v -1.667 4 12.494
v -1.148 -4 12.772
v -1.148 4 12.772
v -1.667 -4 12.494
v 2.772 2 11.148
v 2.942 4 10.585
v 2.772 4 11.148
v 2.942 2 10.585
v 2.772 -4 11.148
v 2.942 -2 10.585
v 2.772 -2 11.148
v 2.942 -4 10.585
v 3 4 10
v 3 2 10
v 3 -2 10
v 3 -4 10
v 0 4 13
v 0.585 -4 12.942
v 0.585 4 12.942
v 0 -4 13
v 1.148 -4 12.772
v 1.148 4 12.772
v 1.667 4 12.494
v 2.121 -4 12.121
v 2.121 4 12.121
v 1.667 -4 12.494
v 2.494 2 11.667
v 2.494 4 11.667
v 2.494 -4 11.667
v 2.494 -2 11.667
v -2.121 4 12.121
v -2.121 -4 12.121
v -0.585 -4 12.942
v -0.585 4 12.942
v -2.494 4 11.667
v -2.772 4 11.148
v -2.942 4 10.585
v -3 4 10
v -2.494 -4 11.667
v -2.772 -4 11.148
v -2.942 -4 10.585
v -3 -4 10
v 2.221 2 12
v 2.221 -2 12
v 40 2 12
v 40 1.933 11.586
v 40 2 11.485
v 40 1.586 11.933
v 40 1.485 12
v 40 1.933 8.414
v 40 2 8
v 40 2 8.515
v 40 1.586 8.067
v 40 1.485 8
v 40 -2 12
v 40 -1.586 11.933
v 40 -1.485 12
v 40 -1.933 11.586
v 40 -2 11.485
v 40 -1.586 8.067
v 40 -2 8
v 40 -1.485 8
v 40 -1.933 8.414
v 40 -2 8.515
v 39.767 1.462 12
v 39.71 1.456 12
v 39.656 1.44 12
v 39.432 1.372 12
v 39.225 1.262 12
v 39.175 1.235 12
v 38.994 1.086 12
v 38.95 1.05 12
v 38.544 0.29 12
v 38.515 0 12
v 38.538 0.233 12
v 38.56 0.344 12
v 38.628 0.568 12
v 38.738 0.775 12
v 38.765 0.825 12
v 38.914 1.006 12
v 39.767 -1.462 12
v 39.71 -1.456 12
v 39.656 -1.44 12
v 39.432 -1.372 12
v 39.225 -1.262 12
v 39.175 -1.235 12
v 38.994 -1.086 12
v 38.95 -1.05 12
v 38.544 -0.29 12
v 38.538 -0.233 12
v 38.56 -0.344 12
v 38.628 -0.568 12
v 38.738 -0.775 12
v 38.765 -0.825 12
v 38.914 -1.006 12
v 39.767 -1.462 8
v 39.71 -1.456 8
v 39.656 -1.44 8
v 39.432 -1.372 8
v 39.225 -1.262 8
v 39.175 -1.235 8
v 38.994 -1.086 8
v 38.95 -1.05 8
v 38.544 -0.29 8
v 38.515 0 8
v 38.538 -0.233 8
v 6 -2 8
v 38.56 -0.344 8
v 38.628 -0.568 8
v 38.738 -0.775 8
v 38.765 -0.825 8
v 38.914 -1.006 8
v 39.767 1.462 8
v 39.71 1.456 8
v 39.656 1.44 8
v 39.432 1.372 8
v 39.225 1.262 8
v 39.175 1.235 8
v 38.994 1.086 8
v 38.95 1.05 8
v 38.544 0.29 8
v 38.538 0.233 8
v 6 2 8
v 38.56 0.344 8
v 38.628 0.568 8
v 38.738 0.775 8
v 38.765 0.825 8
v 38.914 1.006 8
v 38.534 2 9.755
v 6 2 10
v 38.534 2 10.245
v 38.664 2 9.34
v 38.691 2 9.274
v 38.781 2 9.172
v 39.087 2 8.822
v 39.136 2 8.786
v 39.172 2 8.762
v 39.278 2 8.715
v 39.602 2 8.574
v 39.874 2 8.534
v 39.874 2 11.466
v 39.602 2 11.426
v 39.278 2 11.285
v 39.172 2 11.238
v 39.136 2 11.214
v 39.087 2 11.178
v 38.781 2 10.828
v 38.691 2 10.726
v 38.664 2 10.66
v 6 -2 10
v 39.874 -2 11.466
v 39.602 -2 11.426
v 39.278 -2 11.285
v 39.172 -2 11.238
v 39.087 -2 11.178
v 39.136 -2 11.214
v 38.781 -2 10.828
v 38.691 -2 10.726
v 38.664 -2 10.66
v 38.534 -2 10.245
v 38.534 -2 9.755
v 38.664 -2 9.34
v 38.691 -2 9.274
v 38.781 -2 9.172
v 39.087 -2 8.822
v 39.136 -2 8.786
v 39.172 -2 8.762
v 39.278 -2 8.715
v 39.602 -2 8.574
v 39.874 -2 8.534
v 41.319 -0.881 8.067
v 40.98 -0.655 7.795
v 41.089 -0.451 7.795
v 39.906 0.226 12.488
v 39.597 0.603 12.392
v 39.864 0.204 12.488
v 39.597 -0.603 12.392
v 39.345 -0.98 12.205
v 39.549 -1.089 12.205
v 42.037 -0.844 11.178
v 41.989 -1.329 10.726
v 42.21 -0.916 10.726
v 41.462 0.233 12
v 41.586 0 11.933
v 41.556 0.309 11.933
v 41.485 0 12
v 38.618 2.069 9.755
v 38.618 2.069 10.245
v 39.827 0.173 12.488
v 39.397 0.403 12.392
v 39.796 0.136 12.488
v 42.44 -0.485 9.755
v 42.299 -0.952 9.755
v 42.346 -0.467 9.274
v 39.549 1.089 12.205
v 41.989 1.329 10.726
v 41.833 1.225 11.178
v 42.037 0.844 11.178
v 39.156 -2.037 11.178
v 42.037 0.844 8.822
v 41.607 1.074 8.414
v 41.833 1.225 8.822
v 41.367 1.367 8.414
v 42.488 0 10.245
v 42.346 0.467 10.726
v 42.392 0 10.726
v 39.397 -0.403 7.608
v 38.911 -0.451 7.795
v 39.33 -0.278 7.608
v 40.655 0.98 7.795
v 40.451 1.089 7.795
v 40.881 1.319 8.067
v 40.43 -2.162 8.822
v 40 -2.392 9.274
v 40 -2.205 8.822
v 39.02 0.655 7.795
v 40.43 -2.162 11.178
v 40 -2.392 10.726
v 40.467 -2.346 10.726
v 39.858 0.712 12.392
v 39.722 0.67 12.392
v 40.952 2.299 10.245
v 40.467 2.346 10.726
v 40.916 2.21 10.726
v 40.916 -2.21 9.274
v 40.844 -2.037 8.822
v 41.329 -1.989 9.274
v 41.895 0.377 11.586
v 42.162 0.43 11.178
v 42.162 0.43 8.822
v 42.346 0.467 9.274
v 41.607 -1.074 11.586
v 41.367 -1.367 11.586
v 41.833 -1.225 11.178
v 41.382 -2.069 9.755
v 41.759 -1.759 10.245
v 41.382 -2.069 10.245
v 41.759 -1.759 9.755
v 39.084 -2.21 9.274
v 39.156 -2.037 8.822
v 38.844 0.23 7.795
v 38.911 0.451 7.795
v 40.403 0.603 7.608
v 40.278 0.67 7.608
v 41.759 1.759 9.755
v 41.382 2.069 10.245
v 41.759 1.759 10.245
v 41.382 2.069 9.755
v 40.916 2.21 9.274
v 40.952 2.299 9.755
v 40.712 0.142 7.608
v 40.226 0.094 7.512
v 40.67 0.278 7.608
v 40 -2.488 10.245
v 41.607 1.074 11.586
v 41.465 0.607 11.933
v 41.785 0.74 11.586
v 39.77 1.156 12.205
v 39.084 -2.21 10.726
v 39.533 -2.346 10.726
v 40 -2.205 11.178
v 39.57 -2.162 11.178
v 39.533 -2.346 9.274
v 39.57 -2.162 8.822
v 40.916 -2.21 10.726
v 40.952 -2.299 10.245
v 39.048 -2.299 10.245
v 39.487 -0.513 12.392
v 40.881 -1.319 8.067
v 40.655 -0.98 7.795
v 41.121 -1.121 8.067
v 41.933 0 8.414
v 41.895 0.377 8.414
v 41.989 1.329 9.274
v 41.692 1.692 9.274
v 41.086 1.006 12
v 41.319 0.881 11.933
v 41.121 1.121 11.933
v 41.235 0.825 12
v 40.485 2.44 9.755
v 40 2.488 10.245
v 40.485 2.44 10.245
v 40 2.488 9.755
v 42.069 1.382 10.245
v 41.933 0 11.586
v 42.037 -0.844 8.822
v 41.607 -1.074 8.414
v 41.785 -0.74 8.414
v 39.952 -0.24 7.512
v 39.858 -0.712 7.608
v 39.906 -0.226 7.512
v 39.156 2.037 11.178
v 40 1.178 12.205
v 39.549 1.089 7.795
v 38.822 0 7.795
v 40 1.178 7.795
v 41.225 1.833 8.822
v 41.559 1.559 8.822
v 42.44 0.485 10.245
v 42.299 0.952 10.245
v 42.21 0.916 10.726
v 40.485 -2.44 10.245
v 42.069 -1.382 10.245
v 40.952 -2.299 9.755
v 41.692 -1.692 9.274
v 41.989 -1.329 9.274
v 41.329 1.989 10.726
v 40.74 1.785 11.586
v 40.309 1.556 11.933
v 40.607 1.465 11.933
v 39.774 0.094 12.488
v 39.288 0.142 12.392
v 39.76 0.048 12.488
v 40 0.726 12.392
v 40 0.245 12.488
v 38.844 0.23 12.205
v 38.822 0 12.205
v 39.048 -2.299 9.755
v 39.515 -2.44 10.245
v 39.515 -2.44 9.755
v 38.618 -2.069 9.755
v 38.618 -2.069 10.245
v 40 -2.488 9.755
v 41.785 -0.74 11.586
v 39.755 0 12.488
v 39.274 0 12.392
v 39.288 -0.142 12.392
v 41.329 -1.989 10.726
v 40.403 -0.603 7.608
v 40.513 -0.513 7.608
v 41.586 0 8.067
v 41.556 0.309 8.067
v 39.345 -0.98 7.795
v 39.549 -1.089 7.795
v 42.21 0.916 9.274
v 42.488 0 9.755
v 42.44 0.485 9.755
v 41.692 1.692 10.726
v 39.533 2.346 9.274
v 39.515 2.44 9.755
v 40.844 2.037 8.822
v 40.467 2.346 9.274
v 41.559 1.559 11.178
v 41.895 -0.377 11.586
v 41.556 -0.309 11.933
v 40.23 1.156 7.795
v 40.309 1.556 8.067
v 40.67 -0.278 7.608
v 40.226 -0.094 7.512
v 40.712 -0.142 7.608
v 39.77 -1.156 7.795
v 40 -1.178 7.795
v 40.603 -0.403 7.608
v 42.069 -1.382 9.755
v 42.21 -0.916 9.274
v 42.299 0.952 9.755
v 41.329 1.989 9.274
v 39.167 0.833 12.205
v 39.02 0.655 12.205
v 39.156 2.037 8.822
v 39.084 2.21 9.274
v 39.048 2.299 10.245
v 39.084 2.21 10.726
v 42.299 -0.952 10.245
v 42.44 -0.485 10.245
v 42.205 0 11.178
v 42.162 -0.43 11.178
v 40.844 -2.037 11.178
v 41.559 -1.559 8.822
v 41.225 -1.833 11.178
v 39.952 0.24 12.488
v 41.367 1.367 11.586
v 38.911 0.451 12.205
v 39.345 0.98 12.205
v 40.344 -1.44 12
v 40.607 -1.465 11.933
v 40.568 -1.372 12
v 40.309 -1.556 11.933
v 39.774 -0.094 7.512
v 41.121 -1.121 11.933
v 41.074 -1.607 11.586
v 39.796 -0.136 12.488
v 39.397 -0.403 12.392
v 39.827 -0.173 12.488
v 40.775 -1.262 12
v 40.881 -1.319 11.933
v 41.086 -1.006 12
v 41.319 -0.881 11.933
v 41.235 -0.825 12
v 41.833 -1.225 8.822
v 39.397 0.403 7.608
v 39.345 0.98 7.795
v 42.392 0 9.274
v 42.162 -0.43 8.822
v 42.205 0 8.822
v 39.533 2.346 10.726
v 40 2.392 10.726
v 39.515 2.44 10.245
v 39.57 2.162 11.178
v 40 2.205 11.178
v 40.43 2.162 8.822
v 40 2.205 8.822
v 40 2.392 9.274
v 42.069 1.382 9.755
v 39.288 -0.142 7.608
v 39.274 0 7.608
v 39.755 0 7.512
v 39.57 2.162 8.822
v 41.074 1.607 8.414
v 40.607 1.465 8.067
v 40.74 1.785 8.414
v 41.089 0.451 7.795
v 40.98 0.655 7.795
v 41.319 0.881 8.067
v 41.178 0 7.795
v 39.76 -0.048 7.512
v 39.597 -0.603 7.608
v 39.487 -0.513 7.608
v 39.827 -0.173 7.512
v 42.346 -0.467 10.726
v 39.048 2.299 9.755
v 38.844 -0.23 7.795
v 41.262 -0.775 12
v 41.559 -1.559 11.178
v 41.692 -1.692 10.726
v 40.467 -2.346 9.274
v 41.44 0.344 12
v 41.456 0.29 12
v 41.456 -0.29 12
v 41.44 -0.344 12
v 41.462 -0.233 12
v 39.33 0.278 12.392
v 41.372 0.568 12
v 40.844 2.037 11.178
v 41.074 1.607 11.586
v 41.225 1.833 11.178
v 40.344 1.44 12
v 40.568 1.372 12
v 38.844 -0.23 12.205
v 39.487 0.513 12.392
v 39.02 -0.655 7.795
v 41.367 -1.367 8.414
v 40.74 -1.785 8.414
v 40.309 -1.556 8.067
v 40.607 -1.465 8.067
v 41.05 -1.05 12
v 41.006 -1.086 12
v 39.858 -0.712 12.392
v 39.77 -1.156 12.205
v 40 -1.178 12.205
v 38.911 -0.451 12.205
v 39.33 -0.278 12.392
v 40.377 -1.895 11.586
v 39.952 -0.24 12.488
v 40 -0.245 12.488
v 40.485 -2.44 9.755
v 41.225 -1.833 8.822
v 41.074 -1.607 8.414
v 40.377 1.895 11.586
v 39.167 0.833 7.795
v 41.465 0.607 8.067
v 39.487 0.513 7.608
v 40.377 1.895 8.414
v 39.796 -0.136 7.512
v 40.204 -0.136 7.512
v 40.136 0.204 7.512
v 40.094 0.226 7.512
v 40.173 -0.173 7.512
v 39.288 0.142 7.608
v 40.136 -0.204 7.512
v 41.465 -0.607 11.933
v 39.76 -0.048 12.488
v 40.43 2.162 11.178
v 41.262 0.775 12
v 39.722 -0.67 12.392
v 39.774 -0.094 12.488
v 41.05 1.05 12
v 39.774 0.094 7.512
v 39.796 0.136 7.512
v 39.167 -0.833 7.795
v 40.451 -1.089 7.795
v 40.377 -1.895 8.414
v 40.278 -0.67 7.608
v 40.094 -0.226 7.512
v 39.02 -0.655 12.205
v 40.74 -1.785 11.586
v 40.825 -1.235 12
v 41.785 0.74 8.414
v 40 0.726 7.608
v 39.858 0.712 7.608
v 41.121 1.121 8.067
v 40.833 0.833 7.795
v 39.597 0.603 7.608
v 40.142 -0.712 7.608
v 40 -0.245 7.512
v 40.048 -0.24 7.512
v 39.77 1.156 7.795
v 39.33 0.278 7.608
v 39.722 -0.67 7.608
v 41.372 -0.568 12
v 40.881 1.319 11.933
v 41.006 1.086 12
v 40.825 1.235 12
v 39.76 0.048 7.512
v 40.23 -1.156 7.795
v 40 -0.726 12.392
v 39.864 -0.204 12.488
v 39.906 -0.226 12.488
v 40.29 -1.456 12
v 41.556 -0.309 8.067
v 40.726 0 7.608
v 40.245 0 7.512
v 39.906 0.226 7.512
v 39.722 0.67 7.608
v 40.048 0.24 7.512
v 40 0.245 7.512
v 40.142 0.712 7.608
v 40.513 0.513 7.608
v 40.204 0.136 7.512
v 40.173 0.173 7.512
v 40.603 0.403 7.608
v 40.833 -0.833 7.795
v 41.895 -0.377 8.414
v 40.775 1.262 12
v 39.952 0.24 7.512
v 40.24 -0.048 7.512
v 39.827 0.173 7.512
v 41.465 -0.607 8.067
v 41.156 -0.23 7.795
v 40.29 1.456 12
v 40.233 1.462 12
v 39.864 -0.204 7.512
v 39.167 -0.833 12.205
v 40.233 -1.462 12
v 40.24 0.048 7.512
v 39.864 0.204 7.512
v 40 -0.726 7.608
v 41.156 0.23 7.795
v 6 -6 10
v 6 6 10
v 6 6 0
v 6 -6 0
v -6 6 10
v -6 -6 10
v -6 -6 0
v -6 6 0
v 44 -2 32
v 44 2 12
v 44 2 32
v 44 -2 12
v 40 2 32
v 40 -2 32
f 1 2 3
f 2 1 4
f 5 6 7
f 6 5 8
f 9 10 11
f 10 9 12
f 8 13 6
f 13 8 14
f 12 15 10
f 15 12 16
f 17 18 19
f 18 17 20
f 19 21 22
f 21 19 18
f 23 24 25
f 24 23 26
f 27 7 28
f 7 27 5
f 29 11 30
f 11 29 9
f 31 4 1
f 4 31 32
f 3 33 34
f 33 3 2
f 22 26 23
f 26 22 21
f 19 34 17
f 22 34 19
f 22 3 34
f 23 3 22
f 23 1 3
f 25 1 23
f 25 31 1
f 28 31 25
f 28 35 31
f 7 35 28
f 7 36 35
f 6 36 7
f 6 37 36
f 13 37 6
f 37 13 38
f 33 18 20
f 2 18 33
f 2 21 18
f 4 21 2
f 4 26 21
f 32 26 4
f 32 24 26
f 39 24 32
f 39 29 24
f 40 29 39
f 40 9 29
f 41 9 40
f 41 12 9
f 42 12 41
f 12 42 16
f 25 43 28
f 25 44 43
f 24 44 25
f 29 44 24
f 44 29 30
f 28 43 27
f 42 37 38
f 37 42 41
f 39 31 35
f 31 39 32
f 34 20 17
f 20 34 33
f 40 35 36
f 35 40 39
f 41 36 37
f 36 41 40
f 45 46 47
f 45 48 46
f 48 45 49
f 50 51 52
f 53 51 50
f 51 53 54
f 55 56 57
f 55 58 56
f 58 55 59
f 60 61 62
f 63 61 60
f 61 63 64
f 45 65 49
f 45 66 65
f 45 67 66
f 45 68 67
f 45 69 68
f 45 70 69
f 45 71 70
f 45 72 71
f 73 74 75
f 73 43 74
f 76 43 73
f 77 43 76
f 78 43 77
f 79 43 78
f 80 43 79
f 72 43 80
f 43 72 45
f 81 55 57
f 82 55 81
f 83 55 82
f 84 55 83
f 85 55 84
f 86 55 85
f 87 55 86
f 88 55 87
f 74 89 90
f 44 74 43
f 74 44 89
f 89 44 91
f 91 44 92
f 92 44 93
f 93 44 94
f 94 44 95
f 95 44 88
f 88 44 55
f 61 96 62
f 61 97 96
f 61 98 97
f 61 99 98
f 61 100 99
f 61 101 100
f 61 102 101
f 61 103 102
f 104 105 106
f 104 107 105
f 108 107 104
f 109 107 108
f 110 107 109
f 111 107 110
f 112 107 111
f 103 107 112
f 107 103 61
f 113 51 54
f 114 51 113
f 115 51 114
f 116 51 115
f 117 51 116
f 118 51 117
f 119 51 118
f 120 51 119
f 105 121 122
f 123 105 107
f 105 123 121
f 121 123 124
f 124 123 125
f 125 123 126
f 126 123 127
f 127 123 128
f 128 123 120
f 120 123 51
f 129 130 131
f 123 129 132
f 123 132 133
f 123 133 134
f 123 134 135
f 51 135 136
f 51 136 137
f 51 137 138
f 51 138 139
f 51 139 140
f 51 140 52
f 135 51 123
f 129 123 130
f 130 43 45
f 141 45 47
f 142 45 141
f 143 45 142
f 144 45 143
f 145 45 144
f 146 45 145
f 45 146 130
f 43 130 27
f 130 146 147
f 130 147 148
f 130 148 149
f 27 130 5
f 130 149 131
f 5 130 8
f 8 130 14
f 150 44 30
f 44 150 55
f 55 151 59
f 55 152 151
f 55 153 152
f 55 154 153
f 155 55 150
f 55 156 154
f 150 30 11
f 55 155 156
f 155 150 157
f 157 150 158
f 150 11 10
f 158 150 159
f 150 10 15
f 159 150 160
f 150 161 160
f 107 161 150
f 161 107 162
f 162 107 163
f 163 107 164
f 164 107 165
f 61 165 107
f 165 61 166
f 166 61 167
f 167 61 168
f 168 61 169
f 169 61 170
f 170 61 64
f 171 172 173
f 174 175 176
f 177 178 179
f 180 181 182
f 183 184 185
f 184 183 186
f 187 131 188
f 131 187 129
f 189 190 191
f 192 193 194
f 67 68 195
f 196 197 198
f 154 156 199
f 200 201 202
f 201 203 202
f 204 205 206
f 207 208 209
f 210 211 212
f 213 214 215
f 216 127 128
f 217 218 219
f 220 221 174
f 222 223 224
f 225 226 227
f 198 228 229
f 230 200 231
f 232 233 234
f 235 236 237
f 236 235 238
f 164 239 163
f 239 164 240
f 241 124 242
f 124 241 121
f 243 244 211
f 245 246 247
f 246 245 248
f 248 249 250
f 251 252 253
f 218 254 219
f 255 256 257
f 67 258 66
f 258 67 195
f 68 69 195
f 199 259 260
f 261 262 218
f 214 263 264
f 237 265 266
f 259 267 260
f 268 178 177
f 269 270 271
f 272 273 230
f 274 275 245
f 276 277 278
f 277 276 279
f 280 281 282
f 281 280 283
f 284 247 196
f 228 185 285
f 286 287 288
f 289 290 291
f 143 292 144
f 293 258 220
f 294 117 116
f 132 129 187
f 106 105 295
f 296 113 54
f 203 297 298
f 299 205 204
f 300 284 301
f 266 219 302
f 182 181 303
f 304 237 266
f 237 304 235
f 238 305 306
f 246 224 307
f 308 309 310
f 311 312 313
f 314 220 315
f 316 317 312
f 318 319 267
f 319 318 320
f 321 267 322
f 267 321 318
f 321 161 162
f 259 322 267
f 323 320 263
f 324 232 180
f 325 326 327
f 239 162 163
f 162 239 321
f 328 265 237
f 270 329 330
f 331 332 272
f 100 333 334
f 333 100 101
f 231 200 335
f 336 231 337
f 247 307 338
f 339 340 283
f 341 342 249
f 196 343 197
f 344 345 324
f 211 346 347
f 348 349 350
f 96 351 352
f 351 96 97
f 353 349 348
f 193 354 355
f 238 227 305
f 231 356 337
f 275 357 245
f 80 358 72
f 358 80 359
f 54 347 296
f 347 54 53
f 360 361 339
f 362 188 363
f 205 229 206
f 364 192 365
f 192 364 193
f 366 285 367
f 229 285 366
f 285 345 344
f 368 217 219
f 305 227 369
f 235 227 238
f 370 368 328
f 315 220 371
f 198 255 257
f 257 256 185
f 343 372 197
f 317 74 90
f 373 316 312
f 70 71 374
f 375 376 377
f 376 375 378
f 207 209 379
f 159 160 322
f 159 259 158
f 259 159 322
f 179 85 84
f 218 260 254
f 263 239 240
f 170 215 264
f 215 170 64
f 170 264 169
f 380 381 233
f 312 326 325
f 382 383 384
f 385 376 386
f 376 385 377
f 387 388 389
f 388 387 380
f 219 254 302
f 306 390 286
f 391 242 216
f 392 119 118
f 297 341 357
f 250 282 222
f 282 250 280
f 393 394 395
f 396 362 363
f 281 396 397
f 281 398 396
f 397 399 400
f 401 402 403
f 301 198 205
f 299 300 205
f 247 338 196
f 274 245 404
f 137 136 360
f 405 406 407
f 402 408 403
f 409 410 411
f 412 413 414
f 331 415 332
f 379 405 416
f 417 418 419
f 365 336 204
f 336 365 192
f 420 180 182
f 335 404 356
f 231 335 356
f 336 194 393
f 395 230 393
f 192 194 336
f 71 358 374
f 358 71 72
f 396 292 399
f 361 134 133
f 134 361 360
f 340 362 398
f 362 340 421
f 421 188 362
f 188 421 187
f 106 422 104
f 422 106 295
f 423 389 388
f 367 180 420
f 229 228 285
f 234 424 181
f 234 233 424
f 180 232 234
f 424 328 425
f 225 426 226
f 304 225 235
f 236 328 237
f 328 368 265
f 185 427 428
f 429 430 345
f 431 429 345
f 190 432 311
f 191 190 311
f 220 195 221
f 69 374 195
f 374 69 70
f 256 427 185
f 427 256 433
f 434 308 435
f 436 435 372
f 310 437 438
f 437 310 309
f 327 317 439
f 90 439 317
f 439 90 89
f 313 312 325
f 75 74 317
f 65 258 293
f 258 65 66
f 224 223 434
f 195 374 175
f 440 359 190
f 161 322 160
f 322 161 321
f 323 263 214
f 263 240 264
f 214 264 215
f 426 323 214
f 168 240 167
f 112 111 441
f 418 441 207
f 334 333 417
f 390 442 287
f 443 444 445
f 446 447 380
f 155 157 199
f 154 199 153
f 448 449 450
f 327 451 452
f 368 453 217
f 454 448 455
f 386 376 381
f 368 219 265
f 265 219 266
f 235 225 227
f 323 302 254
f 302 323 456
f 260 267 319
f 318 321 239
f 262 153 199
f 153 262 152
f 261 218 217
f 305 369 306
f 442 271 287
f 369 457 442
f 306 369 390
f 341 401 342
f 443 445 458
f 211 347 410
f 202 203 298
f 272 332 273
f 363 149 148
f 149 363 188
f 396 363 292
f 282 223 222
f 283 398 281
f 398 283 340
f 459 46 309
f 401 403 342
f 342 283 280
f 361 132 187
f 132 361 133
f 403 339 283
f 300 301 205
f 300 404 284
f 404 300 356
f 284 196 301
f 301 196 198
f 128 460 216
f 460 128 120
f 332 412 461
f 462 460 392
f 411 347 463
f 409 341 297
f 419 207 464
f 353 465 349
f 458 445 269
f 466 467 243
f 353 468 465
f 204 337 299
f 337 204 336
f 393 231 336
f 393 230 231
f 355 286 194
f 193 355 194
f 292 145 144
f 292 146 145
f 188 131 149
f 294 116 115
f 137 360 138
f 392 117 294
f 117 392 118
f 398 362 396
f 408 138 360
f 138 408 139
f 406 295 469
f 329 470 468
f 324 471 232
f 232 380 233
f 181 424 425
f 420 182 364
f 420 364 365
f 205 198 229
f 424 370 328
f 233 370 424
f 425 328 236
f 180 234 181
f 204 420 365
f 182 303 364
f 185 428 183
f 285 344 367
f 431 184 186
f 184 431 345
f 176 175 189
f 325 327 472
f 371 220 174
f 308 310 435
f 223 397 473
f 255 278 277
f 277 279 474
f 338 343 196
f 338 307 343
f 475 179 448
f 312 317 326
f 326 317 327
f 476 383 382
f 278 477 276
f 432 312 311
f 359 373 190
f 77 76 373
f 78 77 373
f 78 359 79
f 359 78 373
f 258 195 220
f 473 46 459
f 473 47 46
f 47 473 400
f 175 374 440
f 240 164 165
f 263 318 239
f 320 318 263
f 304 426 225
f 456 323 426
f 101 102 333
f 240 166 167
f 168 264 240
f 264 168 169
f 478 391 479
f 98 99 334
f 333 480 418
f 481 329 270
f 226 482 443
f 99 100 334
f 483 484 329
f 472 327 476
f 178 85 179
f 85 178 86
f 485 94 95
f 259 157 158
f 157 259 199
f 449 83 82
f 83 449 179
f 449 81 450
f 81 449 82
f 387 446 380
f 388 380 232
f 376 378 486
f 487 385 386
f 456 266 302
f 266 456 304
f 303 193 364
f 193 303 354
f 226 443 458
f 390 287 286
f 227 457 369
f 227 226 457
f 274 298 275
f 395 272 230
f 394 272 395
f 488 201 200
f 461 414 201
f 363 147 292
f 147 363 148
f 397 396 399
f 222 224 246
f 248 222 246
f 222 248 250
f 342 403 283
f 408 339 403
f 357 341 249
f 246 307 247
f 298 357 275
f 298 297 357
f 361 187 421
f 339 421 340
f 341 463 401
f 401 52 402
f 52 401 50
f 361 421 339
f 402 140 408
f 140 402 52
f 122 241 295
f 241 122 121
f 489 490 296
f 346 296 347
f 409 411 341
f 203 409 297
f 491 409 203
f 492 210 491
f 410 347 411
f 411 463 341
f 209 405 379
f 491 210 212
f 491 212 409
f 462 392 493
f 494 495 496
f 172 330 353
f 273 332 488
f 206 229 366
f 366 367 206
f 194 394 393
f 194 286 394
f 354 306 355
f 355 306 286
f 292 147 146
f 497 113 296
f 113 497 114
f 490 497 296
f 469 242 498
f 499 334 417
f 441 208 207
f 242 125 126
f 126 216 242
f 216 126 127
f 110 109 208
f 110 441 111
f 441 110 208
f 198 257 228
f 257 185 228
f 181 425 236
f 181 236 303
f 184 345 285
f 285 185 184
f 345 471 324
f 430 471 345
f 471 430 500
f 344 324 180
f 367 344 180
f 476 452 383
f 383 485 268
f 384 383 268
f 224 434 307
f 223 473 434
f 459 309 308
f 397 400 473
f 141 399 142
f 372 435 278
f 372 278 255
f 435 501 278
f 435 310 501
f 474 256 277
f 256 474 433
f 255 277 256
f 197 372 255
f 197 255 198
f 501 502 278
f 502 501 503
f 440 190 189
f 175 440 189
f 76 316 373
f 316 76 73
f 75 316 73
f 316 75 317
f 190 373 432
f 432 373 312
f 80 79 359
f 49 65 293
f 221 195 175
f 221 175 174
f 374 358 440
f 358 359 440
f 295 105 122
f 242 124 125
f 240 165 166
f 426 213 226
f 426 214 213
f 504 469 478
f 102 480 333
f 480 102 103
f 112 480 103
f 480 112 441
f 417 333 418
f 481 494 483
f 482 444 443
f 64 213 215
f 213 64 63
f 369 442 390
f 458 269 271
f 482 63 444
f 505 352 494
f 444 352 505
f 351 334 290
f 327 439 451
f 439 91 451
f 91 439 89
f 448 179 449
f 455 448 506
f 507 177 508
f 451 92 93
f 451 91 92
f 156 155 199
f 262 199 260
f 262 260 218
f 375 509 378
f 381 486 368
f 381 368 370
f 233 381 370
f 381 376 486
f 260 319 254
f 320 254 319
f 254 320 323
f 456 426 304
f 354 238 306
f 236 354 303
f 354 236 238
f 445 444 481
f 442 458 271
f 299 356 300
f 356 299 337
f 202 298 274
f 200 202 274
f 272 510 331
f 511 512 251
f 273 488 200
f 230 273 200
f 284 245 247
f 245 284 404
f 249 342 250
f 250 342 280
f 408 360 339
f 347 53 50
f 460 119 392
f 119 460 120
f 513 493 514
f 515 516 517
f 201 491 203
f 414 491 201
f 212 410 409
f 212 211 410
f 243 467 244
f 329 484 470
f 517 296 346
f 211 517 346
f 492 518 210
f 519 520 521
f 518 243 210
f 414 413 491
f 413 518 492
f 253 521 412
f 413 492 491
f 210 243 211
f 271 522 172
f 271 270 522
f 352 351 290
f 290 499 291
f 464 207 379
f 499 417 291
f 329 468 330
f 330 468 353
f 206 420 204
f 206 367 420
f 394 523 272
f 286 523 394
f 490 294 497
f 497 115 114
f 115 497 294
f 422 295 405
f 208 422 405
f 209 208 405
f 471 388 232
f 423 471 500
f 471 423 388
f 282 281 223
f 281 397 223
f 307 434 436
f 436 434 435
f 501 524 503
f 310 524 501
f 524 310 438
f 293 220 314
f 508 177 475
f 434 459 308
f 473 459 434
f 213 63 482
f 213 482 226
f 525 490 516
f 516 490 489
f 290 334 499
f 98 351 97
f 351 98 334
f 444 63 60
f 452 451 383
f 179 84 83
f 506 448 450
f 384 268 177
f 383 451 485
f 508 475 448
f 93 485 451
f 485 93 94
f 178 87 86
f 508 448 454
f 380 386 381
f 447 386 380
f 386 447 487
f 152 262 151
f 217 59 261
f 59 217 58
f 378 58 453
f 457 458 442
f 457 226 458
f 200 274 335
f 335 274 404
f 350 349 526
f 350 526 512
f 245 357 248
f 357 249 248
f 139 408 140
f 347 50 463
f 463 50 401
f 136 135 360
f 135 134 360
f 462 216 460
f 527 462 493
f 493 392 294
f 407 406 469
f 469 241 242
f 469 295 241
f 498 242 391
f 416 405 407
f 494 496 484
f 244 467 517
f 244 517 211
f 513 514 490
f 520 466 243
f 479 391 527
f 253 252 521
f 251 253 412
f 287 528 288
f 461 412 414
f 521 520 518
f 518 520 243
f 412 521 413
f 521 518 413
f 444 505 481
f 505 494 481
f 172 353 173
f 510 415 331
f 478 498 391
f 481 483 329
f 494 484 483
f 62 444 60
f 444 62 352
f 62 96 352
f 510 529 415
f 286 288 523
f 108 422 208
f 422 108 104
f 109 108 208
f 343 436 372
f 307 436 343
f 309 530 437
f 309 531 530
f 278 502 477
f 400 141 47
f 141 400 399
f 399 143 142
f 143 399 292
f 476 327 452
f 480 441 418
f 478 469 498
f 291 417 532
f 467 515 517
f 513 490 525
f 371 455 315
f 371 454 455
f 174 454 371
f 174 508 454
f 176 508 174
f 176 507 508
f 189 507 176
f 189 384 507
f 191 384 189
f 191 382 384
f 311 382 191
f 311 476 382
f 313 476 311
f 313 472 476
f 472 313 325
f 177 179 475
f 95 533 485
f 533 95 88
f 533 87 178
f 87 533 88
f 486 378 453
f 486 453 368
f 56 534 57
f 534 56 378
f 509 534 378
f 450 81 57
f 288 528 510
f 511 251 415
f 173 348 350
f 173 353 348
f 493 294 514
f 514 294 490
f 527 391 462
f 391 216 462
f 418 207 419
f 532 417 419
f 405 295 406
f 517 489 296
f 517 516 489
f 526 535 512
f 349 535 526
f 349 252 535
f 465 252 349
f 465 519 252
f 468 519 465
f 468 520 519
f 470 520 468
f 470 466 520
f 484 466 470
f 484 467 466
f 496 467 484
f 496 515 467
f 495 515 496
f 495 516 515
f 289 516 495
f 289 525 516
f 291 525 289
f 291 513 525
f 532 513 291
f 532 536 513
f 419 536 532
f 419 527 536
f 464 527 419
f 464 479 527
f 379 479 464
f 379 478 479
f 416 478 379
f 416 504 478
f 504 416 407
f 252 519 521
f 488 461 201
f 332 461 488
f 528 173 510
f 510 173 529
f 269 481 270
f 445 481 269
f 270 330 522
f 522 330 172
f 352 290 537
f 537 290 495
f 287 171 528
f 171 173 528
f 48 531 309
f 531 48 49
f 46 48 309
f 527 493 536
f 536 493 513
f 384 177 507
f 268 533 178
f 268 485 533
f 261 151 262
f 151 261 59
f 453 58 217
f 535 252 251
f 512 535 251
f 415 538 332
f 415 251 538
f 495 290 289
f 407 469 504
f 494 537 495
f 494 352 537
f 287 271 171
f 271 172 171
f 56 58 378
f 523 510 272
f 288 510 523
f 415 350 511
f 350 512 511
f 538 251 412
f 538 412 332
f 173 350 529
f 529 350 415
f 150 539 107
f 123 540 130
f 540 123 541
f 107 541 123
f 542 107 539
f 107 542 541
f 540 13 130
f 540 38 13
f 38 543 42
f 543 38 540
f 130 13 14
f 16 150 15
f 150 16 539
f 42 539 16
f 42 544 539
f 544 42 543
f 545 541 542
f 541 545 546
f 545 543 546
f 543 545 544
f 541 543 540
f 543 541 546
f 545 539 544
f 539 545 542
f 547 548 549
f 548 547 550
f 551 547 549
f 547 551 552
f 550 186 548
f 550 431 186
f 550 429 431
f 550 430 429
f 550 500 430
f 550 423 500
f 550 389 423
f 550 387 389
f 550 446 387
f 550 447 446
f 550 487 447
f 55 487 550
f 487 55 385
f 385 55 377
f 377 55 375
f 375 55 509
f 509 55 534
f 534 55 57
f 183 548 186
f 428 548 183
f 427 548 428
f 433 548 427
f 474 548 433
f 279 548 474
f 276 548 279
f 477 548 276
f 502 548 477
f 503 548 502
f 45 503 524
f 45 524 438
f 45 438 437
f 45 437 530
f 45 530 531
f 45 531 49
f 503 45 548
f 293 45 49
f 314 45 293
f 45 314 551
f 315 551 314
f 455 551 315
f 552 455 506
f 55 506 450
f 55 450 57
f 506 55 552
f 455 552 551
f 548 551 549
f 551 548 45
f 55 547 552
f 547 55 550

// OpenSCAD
// kinematics_gates: base (static) + arm hinged on a Y pin at (0,0,10) + link on a ball at the arm tip.
// A = arm angle about the pin. Echoes ARM_TILT for the angle gate.
MODE = is_undef(MODE) ? "assembly" : MODE;
PART = is_undef(PART) ? "" : PART;
A = is_undef(A) ? 0 : A;
$fn = 32;
echo(ARM_TILT = A, ARM_TWIN = -1.5 * A, ARM_LIE = A / 4);   // several names in one echo: the parser must read all; ARM_LIE understates the turn
module base() { translate([-6, -6, 0]) cube([12, 12, 10]); }
module arm() { translate([0, 0, 10]) rotate([0, -A, 0]) { rotate([90, 0, 0]) cylinder(d=6, h=8, center=true); translate([0, -2, -2]) cube([40, 4, 4]); translate([40, 0, 0]) sphere(d=5); } }
module tip() { translate([0, 0, 10]) rotate([0, -A, 0]) translate([40, 0, 0]) sphere(d=5); }
module link() { translate([0, 0, 10]) rotate([0, -A, 0]) translate([40, 0, 0]) translate([0, -2, 2]) cube([4, 4, 20]); }
module morph() { translate([0, -2, 8]) cube([10 + A / 2, 4, 4]); }   // not rigid: grows with A
module twin() { translate([0, 0, 10]) rotate([0, -A, 0]) { translate([40, 0, 0]) sphere(d=5); translate([20, 0, 6]) sphere(d=5); } }
if (PART == "base") base();
else if (PART == "arm") arm();
else if (PART == "link") link();
else if (PART == "twin") twin();
else if (PART == "morph") morph();
else { base(); arm(); link(); }
